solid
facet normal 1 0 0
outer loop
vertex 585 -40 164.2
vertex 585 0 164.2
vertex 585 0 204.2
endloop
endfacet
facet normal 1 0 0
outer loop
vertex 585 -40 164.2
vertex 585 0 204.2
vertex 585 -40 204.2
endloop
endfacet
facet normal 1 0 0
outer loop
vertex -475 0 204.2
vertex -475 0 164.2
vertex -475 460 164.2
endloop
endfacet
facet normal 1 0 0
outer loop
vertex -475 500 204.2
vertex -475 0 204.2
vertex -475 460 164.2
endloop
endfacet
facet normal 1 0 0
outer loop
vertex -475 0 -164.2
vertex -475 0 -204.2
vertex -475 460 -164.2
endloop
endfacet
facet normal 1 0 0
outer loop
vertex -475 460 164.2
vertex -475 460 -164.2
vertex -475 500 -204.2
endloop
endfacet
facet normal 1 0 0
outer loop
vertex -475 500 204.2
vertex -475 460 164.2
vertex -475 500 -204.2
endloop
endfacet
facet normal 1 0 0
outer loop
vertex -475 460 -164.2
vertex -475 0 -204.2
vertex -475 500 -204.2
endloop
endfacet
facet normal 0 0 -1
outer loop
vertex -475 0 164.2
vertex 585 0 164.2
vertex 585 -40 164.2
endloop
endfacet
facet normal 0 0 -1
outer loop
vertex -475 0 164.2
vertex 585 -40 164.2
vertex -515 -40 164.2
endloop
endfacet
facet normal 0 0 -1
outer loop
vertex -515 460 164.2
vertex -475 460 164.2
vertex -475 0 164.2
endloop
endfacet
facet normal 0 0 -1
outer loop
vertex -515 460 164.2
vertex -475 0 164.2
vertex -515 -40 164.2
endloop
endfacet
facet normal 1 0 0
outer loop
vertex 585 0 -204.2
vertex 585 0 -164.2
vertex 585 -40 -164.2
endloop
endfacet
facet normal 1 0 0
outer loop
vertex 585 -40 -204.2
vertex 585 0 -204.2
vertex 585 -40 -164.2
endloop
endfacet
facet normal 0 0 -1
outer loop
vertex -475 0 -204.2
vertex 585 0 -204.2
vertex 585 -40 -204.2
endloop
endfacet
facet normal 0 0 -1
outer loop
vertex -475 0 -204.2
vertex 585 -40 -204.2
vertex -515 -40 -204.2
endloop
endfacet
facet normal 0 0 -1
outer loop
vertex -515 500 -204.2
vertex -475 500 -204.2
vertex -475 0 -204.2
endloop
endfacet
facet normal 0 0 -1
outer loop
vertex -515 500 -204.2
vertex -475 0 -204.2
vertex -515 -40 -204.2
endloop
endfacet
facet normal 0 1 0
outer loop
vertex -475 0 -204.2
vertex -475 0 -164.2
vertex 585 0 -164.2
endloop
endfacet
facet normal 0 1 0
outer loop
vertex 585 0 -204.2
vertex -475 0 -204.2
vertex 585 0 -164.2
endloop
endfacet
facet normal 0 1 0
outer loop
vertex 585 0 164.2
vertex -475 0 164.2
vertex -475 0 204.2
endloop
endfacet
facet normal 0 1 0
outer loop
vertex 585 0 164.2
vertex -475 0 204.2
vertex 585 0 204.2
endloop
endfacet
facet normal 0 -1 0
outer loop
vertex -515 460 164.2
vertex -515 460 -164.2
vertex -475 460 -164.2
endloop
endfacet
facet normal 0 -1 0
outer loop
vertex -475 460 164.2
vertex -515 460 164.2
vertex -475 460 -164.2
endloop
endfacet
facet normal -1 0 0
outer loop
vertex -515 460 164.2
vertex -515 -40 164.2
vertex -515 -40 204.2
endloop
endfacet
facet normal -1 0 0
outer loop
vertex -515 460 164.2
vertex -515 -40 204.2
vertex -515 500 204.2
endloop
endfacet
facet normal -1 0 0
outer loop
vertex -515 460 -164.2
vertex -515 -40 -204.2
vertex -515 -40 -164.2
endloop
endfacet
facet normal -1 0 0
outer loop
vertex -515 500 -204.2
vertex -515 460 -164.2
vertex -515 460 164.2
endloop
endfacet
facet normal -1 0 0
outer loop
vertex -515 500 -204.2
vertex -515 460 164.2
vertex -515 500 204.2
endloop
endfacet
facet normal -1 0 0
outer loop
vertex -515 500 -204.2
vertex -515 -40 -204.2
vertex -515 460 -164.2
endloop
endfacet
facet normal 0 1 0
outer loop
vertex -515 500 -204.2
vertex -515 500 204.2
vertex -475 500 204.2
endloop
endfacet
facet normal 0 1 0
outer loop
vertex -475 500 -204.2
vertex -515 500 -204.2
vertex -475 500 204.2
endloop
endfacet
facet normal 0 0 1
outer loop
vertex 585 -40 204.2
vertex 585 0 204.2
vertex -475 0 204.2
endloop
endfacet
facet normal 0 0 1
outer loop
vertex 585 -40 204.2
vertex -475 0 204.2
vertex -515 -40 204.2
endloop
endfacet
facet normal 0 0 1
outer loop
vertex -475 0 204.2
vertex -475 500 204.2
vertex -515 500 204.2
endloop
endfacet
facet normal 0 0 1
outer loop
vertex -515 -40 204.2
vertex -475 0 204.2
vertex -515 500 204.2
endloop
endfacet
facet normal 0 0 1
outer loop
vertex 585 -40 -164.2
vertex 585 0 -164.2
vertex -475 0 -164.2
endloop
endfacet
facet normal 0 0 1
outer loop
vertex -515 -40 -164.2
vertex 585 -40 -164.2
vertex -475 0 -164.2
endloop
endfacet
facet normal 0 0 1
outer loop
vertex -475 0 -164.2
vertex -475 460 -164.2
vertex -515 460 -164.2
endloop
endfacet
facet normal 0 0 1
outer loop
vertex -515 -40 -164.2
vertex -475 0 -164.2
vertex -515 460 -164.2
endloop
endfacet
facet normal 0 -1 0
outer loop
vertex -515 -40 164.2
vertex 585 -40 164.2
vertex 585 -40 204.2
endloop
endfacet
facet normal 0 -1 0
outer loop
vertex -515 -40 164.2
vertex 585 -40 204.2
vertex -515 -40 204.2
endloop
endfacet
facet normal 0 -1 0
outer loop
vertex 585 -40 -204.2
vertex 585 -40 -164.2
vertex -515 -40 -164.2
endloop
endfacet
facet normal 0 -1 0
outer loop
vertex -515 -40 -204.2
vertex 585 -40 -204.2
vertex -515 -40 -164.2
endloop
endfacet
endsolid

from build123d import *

# Parameters (mm, degrees)
EXTRUDE_1_DEPTH = 40
SKETCH_6_W      = 40
SKETCH_6_H      = 408.4
EXTRUDE_2_DEPTH = 40


with BuildPart() as part:
    # 草图2 → 凸台-拉伸1 (new body)
    with BuildSketch(Plane.XY.offset(164.2)):
        Polygon((-475, 0), (585, 0), (585, -40), (-515, -40), (-515, 500), (-475, 500), (-475, 460), align=None)
    extrude(amount=EXTRUDE_1_DEPTH)


with BuildPart() as body_2:
    # 镜向4: mirrored copy
    add(part.part.mirror(Plane.XY))


with BuildPart() as part_1:
    add(part.part)

    add(body_2.part)  # 凸台-拉伸2 merges body 2
    # 草图6 → 凸台-拉伸2 (add)
    with BuildSketch(Plane(origin=(0, 500, 0), x_dir=(1, 0, 0), z_dir=(0, 1, 0))):
        with Locations((-495, 0)):
            Rectangle(SKETCH_6_W, SKETCH_6_H)
    extrude(amount=-EXTRUDE_2_DEPTH)


solid = part_1.part
